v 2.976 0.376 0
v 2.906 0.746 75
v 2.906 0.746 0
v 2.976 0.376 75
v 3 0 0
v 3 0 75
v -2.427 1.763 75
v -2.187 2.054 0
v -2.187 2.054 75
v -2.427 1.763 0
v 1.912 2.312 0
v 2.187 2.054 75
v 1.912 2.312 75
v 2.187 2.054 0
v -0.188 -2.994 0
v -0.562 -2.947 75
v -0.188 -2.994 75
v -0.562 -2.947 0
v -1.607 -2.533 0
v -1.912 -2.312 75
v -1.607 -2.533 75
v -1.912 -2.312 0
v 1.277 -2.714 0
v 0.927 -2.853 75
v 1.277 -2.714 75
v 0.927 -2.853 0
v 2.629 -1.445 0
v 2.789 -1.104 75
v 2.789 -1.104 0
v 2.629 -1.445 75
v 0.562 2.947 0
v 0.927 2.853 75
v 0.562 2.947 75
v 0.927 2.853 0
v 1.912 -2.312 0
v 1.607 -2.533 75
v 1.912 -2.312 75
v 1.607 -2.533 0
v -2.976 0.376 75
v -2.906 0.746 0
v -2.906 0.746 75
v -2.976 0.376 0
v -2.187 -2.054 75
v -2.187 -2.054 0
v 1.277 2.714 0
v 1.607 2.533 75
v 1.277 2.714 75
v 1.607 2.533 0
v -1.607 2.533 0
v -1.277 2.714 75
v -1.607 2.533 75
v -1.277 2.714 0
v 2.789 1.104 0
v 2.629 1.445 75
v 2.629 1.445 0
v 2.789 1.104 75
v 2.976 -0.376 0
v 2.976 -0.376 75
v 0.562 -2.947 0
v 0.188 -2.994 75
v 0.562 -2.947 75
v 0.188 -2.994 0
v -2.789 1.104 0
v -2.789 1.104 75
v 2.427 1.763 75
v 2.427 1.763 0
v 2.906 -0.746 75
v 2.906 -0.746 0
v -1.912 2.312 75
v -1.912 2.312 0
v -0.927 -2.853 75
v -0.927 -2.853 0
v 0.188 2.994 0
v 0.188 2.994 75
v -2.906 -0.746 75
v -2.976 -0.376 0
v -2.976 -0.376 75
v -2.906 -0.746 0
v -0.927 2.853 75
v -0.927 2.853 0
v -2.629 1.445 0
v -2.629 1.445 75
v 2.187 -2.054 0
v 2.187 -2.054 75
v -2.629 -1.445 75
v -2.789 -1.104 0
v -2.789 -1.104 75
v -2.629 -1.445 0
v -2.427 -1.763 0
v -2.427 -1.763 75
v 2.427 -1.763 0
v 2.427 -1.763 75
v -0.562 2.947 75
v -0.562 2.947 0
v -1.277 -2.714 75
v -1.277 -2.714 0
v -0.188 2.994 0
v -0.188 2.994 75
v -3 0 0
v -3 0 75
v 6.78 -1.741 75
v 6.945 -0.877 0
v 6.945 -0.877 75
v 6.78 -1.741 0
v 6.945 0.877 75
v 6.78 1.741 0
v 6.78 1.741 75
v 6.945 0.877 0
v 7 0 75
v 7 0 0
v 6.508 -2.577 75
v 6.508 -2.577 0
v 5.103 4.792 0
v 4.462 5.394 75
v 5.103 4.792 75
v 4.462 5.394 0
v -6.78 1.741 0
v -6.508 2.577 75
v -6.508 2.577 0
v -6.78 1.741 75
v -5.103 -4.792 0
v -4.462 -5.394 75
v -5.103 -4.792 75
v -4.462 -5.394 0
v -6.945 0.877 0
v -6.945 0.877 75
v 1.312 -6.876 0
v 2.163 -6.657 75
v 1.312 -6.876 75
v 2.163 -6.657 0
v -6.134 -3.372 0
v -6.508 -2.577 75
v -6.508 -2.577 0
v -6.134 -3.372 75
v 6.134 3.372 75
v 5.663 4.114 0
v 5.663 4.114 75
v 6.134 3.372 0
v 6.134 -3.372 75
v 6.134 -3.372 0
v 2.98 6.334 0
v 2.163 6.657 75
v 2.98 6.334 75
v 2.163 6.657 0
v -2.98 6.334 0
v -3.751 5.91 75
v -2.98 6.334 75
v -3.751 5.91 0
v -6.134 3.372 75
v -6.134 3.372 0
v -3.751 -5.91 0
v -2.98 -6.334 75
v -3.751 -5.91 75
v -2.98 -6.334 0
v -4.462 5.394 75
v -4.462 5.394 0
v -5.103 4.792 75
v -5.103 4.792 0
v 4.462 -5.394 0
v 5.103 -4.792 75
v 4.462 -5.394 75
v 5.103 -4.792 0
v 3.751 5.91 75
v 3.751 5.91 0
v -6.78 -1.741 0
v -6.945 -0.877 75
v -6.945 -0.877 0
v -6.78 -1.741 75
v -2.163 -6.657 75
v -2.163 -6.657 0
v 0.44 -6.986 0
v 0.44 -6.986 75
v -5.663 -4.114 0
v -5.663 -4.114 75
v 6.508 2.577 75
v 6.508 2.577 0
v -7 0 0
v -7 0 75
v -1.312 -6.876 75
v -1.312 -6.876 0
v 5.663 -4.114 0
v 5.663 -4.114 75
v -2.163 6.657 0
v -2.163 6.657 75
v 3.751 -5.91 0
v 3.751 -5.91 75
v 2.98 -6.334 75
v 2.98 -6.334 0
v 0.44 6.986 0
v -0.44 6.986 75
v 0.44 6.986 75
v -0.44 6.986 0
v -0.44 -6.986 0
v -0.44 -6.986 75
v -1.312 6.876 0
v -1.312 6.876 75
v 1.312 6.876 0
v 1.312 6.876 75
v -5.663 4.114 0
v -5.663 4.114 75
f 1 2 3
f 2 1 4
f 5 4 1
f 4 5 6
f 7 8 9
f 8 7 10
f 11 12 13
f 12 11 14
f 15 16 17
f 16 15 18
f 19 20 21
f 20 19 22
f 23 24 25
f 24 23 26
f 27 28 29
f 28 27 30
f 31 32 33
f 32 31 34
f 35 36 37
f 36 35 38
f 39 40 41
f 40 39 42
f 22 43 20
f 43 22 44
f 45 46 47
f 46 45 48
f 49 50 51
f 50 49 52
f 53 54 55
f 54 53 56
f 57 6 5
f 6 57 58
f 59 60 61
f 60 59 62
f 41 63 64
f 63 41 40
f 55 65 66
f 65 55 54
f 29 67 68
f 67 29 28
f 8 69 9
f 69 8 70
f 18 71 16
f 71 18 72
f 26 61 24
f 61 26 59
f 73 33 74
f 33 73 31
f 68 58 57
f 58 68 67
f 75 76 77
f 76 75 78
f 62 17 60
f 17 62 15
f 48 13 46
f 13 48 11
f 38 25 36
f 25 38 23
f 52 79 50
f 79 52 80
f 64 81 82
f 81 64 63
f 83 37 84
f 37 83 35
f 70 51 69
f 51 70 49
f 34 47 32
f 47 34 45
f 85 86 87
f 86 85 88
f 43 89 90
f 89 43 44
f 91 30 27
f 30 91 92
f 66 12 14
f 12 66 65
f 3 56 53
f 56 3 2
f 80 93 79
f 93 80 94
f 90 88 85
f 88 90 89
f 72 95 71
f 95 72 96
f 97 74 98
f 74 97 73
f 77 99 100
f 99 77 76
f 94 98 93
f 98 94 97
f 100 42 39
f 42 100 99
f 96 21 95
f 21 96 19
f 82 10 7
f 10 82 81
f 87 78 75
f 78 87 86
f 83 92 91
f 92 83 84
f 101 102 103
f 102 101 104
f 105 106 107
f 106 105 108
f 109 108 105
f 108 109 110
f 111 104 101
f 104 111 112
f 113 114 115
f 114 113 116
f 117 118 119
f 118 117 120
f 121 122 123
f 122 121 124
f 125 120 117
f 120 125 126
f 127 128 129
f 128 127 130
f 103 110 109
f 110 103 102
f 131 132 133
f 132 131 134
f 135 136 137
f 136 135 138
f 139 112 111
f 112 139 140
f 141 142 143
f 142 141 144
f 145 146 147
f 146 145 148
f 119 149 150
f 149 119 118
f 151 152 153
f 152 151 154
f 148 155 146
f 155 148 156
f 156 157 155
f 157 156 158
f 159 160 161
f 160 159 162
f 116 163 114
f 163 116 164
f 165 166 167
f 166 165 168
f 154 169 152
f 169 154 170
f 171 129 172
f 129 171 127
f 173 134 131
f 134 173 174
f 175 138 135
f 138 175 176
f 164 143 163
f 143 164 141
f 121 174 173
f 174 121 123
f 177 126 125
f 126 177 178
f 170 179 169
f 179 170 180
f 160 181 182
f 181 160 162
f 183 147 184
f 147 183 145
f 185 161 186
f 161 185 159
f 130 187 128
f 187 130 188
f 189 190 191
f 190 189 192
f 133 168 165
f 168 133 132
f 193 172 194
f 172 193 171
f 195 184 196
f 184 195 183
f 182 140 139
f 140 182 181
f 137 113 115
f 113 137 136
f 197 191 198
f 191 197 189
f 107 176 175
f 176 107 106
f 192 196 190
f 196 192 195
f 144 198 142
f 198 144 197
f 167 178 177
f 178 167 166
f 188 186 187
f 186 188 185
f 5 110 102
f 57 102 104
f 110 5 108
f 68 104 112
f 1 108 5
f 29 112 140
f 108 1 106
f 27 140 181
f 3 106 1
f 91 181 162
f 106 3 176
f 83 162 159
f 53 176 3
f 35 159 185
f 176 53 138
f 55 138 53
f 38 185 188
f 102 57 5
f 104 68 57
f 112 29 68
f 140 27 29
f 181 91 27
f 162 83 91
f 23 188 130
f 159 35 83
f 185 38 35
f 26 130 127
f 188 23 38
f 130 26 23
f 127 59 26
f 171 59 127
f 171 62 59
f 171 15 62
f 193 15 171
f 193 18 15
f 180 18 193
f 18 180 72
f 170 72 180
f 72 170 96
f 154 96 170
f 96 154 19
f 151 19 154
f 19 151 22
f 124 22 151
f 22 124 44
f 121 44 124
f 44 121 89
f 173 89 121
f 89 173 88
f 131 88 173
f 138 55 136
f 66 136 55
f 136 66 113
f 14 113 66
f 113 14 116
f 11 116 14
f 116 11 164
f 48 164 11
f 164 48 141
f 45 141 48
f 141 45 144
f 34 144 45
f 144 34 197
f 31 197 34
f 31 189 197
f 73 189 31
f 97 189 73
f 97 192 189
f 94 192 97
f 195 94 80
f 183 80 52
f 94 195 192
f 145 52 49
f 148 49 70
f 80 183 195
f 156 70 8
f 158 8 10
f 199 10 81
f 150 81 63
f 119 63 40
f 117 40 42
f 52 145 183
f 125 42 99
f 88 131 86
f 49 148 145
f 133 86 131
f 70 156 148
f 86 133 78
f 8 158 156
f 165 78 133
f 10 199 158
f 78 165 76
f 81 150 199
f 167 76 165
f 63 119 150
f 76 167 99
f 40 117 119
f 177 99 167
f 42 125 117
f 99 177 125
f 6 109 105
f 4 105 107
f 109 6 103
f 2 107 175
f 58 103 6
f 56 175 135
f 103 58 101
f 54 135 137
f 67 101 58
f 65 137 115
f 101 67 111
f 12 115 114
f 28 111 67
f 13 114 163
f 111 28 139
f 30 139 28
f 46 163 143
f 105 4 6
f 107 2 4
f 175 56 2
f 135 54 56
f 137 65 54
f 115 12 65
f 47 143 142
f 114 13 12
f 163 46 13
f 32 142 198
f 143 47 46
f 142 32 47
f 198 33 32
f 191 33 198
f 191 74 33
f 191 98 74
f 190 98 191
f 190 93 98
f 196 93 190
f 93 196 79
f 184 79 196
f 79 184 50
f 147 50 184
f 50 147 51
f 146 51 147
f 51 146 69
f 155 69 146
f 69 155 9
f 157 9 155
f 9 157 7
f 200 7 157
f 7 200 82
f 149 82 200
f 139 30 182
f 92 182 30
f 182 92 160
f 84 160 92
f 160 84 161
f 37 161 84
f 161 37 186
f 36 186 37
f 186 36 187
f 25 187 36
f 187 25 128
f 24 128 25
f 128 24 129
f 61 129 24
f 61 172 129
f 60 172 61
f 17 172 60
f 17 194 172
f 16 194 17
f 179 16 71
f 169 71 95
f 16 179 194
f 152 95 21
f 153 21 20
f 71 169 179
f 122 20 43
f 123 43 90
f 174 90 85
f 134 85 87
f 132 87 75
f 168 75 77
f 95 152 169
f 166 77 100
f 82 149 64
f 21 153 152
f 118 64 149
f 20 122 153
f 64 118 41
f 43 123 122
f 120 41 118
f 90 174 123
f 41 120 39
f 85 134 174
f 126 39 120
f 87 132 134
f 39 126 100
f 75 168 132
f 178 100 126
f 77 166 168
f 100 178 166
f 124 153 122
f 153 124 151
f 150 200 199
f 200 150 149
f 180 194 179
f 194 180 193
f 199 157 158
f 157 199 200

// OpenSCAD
$fn = 50;


difference() {
	union() {
		cylinder(h = 75, r = 7.0000000000);
	}
	union() {
		translate(v = [0.0000000000, 0.0000000000, -100.0000000000]) {
			cylinder(h = 200, r = 3.0000000000);
		}
		cylinder(h = 75, r = 1.5000000000);
		cylinder(h = 75, r = 1.5000000000);
		cylinder(h = 75, r = 1.5000000000);
	}
}
